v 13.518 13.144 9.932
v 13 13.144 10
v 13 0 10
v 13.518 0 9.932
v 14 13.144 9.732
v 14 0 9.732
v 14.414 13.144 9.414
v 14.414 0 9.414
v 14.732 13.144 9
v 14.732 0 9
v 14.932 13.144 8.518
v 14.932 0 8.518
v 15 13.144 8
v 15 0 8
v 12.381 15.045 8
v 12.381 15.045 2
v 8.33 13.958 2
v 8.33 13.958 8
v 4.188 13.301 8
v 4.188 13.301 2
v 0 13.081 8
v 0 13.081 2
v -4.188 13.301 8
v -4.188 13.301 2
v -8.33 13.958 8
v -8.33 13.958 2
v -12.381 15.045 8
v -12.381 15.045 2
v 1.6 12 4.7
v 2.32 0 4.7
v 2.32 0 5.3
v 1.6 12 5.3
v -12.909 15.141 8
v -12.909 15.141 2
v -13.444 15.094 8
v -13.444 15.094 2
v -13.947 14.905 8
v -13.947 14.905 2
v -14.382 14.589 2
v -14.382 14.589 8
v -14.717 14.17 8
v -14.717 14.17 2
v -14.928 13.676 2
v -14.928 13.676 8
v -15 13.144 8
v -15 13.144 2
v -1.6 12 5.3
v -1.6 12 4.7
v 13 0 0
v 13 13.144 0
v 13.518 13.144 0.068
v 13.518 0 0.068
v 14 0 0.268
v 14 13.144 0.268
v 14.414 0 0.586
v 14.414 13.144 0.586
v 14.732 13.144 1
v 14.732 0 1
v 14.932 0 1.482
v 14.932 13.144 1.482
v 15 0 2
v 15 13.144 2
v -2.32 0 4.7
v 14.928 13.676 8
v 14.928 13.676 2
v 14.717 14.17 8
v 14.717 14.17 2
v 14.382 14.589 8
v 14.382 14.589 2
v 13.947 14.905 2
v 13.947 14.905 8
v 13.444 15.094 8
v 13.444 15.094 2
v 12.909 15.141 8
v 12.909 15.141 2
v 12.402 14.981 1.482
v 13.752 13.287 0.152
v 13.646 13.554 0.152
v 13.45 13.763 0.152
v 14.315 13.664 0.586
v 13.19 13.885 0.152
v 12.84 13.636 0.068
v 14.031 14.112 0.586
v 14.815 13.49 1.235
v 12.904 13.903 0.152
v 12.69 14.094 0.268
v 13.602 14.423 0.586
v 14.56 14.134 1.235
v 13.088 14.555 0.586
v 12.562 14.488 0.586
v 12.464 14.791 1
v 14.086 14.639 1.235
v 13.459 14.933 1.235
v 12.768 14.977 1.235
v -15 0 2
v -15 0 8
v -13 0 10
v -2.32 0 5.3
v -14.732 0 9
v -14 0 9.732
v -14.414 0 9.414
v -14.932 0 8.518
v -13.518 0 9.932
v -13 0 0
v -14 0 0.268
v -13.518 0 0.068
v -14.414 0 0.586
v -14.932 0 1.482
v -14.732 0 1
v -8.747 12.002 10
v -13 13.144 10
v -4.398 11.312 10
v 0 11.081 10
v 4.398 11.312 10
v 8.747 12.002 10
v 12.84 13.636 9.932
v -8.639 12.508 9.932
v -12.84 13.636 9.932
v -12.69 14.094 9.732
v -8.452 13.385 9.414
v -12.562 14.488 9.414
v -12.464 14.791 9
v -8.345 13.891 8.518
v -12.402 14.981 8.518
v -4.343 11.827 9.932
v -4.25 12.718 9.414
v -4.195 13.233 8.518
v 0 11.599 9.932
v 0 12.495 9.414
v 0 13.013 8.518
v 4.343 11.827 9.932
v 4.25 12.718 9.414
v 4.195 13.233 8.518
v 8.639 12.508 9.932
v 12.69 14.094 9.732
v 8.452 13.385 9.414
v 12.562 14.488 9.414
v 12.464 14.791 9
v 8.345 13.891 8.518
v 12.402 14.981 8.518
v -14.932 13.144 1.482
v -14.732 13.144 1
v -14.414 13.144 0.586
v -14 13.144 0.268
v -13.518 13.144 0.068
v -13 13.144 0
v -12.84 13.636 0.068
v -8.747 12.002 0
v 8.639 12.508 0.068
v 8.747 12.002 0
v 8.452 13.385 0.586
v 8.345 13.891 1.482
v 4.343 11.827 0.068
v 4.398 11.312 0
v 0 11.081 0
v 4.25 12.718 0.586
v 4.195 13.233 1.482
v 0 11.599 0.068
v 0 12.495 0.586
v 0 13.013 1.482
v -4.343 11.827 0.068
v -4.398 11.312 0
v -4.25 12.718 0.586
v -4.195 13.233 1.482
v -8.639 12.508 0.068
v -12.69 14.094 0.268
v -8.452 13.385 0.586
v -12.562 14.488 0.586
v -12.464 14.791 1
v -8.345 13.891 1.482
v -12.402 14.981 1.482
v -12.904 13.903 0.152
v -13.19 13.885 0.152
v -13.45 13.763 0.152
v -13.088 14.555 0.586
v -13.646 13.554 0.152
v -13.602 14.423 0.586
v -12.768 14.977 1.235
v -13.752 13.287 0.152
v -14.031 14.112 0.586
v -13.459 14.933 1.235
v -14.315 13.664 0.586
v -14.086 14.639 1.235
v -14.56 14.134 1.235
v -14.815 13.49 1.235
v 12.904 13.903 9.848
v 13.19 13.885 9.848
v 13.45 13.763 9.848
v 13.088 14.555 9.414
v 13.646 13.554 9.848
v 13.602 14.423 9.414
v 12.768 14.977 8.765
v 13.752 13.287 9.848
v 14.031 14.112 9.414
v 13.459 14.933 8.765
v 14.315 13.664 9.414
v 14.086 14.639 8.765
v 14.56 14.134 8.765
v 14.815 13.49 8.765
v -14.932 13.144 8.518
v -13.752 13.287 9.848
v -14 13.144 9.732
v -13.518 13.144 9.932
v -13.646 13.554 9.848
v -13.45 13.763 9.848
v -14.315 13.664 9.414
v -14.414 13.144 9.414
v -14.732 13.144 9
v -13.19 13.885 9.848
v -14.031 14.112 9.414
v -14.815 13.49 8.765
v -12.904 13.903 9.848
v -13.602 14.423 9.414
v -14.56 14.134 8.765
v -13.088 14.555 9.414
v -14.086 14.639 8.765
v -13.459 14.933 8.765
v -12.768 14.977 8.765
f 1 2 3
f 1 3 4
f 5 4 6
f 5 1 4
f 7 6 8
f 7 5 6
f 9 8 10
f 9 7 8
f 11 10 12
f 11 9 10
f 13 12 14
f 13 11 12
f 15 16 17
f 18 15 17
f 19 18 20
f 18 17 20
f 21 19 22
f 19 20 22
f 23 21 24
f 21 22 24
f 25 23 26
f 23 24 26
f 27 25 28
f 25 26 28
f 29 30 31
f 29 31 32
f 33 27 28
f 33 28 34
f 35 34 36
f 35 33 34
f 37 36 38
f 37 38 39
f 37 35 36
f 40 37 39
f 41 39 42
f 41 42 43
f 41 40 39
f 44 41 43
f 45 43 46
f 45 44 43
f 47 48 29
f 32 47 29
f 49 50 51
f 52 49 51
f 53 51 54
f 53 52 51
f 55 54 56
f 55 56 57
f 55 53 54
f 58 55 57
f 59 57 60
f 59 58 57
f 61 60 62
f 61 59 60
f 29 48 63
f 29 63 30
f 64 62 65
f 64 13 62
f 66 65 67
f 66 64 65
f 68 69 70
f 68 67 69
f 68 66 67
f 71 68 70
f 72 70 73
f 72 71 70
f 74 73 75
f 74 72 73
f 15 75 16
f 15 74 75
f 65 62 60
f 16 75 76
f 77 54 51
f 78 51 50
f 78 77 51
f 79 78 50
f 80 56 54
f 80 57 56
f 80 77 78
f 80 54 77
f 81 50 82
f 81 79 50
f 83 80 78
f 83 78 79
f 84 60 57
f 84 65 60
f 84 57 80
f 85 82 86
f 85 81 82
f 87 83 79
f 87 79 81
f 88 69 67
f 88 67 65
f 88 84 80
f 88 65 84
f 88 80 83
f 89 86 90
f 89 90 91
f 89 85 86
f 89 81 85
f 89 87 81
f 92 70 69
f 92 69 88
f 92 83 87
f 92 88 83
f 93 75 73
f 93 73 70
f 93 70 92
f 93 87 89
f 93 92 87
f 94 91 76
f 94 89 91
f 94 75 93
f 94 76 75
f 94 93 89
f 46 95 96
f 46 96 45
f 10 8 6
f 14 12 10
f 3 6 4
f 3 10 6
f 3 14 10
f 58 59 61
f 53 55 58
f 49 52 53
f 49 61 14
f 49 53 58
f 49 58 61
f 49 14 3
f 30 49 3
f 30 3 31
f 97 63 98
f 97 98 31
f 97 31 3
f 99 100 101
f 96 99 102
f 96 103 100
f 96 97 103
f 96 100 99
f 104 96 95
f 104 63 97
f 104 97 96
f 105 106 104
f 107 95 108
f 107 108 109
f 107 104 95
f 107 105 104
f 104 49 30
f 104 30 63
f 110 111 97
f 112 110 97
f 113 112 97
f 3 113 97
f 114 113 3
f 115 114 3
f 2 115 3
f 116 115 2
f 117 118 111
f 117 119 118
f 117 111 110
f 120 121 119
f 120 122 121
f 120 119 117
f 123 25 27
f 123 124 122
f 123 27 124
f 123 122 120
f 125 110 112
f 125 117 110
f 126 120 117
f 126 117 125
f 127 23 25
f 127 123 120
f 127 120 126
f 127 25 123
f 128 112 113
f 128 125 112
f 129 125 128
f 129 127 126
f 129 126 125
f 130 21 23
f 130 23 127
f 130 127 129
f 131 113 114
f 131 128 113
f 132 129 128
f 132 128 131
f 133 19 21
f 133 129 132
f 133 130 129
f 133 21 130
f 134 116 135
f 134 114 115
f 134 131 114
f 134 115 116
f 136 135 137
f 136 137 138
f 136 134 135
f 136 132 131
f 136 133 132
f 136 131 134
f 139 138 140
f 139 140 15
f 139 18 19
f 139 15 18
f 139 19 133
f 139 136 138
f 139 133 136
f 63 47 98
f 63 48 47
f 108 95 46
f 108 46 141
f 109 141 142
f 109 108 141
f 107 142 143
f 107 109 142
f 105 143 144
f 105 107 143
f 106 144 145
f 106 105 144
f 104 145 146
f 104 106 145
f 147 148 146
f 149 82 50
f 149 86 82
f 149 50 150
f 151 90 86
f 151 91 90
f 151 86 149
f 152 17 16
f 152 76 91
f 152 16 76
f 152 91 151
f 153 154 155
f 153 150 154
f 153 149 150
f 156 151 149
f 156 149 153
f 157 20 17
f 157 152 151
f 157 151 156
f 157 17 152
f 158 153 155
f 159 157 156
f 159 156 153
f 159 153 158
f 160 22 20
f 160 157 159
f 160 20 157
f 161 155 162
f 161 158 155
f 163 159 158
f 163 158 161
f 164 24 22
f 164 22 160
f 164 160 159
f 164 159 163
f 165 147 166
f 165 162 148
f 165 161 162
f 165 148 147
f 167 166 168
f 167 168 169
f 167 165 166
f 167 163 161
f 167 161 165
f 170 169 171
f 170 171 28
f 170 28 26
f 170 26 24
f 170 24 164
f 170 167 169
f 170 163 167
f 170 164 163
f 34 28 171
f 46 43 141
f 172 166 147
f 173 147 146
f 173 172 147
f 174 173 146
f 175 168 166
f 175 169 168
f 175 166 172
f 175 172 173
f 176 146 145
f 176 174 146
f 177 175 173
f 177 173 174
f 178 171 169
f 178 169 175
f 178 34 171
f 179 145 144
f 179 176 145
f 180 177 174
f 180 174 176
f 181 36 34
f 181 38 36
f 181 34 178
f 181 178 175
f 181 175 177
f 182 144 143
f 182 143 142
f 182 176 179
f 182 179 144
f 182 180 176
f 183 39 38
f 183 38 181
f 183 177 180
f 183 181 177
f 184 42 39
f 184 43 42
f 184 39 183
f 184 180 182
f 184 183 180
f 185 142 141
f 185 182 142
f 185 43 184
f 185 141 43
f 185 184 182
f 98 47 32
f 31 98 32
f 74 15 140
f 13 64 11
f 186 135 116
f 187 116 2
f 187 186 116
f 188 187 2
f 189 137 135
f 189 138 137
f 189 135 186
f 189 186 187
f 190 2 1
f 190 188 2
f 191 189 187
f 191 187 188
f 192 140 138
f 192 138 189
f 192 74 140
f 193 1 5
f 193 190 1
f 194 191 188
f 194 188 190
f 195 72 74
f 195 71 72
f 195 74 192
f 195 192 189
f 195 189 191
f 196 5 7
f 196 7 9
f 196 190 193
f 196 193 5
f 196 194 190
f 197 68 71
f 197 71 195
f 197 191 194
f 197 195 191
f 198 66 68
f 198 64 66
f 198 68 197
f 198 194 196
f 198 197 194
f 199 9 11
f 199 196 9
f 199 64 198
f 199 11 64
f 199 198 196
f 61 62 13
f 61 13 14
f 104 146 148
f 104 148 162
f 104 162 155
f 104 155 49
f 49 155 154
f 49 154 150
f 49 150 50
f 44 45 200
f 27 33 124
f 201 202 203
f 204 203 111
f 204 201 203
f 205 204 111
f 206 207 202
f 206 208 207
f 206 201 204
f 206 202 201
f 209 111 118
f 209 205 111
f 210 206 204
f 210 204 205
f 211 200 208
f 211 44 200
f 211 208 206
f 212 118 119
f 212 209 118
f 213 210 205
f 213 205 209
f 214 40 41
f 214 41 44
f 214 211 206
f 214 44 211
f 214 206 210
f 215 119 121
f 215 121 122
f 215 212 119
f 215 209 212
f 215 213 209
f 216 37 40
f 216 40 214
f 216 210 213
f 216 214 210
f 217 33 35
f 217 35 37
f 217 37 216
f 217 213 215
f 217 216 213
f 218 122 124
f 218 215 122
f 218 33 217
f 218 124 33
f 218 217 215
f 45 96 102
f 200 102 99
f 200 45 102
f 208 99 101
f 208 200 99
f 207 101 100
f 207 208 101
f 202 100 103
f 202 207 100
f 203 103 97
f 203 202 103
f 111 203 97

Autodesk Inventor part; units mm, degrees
ref_plane "YZ Plane" through (0, 0, 0) normal (1, 0, 0) x (0, 1, 0)
ref_plane "XZ Plane" through (0, 0, 0) normal (0, 1, 0) x (-1, 0, 0)
sketch "Sketch1" plane through (0, 0, 0) normal (0, 0, 1) x (1, 0, 0)
  line L0 (0, 0) -> (0, 12)
  line L1 (15, 0) -> (-15, 0)
  line L2 (-15, 0) -> (-15, 12)
  line L3 (-15, 12) -> (15, 12)
  line L4 (15, 12) -> (15, 0)
  line L5 (-15, 12) -> (-15, 16)
  line L6 (15, 12) -> (15, 16)
  arc A0 (-15, 16) -> (15, 16) centre (0, 53.081) ccw
  point P0 (0, 12)
  dimension "d0" = 12
  dimension "d1" = 30
  dimension "d2" = 4
  dimension "d3" = 4
  dimension "d4" = 40
extrude "Extrusion1" add sketch "Sketch1" along normal blind 10
fillet "Fillet1" radius 2 8 edges at (-15, 16, 5) (15, 16, 5) (0, 13.081, 10) (0, 13.081, 0) (15, 8, 10) (-15, 8, 10) (15, 8, 0) (-15, 8, 0)
ref_plane "Work Plane1" through (0, 0, 5) normal (0, 0, 1) x (1, 0, 0)
sketch "Sketch2" plane through (0, 0, 5) normal (0, 0, 1) x (1, 0, 0)
  line L0 (-13, 0) -> (13, 0) projected
  line L1 (-2.5, 0) -> (2.5, 0)
  line L2 (-1.6, 15) -> (1.6, 15)
  line L3 (-1.6, 15) -> (-2.5, 0)
  line L4 (1.6, 15) -> (2.5, 0)
  line L5 (-2.32, 3) -> (2.32, 3)
  line L6 (-2.32, 0) -> (2.32, 0)
  line L7 (-1.6, 12) -> (1.6, 12)
  line L8 (-1.6, 12) -> (-2.32, 0)
  line L9 (2.32, 0) -> (1.6, 12)
  point P0 (0, 0)
  point P1 (0, 0)
  point P2 (0, 15)
  point P3 (0, 0)
  point P4 (0, 12)
  dimension "d9" = 5
  dimension "d10" = 2.5
  dimension "d11" = 3.2
  dimension "d13" = 12
  dimension "d14" = 4.64
  dimension "d15" = 4.64
  dimension "d16" = 2.32
  dimension "d17" = 3.2
  dimension "d18" = 12
extrude "Extrusion2" cut sketch "Sketch2" along normal mid plane 0.6 contours L8 L5 L9 L0 | L8 L7 L9 L5
properties part number "pot slider" material "ABS Plastic"
